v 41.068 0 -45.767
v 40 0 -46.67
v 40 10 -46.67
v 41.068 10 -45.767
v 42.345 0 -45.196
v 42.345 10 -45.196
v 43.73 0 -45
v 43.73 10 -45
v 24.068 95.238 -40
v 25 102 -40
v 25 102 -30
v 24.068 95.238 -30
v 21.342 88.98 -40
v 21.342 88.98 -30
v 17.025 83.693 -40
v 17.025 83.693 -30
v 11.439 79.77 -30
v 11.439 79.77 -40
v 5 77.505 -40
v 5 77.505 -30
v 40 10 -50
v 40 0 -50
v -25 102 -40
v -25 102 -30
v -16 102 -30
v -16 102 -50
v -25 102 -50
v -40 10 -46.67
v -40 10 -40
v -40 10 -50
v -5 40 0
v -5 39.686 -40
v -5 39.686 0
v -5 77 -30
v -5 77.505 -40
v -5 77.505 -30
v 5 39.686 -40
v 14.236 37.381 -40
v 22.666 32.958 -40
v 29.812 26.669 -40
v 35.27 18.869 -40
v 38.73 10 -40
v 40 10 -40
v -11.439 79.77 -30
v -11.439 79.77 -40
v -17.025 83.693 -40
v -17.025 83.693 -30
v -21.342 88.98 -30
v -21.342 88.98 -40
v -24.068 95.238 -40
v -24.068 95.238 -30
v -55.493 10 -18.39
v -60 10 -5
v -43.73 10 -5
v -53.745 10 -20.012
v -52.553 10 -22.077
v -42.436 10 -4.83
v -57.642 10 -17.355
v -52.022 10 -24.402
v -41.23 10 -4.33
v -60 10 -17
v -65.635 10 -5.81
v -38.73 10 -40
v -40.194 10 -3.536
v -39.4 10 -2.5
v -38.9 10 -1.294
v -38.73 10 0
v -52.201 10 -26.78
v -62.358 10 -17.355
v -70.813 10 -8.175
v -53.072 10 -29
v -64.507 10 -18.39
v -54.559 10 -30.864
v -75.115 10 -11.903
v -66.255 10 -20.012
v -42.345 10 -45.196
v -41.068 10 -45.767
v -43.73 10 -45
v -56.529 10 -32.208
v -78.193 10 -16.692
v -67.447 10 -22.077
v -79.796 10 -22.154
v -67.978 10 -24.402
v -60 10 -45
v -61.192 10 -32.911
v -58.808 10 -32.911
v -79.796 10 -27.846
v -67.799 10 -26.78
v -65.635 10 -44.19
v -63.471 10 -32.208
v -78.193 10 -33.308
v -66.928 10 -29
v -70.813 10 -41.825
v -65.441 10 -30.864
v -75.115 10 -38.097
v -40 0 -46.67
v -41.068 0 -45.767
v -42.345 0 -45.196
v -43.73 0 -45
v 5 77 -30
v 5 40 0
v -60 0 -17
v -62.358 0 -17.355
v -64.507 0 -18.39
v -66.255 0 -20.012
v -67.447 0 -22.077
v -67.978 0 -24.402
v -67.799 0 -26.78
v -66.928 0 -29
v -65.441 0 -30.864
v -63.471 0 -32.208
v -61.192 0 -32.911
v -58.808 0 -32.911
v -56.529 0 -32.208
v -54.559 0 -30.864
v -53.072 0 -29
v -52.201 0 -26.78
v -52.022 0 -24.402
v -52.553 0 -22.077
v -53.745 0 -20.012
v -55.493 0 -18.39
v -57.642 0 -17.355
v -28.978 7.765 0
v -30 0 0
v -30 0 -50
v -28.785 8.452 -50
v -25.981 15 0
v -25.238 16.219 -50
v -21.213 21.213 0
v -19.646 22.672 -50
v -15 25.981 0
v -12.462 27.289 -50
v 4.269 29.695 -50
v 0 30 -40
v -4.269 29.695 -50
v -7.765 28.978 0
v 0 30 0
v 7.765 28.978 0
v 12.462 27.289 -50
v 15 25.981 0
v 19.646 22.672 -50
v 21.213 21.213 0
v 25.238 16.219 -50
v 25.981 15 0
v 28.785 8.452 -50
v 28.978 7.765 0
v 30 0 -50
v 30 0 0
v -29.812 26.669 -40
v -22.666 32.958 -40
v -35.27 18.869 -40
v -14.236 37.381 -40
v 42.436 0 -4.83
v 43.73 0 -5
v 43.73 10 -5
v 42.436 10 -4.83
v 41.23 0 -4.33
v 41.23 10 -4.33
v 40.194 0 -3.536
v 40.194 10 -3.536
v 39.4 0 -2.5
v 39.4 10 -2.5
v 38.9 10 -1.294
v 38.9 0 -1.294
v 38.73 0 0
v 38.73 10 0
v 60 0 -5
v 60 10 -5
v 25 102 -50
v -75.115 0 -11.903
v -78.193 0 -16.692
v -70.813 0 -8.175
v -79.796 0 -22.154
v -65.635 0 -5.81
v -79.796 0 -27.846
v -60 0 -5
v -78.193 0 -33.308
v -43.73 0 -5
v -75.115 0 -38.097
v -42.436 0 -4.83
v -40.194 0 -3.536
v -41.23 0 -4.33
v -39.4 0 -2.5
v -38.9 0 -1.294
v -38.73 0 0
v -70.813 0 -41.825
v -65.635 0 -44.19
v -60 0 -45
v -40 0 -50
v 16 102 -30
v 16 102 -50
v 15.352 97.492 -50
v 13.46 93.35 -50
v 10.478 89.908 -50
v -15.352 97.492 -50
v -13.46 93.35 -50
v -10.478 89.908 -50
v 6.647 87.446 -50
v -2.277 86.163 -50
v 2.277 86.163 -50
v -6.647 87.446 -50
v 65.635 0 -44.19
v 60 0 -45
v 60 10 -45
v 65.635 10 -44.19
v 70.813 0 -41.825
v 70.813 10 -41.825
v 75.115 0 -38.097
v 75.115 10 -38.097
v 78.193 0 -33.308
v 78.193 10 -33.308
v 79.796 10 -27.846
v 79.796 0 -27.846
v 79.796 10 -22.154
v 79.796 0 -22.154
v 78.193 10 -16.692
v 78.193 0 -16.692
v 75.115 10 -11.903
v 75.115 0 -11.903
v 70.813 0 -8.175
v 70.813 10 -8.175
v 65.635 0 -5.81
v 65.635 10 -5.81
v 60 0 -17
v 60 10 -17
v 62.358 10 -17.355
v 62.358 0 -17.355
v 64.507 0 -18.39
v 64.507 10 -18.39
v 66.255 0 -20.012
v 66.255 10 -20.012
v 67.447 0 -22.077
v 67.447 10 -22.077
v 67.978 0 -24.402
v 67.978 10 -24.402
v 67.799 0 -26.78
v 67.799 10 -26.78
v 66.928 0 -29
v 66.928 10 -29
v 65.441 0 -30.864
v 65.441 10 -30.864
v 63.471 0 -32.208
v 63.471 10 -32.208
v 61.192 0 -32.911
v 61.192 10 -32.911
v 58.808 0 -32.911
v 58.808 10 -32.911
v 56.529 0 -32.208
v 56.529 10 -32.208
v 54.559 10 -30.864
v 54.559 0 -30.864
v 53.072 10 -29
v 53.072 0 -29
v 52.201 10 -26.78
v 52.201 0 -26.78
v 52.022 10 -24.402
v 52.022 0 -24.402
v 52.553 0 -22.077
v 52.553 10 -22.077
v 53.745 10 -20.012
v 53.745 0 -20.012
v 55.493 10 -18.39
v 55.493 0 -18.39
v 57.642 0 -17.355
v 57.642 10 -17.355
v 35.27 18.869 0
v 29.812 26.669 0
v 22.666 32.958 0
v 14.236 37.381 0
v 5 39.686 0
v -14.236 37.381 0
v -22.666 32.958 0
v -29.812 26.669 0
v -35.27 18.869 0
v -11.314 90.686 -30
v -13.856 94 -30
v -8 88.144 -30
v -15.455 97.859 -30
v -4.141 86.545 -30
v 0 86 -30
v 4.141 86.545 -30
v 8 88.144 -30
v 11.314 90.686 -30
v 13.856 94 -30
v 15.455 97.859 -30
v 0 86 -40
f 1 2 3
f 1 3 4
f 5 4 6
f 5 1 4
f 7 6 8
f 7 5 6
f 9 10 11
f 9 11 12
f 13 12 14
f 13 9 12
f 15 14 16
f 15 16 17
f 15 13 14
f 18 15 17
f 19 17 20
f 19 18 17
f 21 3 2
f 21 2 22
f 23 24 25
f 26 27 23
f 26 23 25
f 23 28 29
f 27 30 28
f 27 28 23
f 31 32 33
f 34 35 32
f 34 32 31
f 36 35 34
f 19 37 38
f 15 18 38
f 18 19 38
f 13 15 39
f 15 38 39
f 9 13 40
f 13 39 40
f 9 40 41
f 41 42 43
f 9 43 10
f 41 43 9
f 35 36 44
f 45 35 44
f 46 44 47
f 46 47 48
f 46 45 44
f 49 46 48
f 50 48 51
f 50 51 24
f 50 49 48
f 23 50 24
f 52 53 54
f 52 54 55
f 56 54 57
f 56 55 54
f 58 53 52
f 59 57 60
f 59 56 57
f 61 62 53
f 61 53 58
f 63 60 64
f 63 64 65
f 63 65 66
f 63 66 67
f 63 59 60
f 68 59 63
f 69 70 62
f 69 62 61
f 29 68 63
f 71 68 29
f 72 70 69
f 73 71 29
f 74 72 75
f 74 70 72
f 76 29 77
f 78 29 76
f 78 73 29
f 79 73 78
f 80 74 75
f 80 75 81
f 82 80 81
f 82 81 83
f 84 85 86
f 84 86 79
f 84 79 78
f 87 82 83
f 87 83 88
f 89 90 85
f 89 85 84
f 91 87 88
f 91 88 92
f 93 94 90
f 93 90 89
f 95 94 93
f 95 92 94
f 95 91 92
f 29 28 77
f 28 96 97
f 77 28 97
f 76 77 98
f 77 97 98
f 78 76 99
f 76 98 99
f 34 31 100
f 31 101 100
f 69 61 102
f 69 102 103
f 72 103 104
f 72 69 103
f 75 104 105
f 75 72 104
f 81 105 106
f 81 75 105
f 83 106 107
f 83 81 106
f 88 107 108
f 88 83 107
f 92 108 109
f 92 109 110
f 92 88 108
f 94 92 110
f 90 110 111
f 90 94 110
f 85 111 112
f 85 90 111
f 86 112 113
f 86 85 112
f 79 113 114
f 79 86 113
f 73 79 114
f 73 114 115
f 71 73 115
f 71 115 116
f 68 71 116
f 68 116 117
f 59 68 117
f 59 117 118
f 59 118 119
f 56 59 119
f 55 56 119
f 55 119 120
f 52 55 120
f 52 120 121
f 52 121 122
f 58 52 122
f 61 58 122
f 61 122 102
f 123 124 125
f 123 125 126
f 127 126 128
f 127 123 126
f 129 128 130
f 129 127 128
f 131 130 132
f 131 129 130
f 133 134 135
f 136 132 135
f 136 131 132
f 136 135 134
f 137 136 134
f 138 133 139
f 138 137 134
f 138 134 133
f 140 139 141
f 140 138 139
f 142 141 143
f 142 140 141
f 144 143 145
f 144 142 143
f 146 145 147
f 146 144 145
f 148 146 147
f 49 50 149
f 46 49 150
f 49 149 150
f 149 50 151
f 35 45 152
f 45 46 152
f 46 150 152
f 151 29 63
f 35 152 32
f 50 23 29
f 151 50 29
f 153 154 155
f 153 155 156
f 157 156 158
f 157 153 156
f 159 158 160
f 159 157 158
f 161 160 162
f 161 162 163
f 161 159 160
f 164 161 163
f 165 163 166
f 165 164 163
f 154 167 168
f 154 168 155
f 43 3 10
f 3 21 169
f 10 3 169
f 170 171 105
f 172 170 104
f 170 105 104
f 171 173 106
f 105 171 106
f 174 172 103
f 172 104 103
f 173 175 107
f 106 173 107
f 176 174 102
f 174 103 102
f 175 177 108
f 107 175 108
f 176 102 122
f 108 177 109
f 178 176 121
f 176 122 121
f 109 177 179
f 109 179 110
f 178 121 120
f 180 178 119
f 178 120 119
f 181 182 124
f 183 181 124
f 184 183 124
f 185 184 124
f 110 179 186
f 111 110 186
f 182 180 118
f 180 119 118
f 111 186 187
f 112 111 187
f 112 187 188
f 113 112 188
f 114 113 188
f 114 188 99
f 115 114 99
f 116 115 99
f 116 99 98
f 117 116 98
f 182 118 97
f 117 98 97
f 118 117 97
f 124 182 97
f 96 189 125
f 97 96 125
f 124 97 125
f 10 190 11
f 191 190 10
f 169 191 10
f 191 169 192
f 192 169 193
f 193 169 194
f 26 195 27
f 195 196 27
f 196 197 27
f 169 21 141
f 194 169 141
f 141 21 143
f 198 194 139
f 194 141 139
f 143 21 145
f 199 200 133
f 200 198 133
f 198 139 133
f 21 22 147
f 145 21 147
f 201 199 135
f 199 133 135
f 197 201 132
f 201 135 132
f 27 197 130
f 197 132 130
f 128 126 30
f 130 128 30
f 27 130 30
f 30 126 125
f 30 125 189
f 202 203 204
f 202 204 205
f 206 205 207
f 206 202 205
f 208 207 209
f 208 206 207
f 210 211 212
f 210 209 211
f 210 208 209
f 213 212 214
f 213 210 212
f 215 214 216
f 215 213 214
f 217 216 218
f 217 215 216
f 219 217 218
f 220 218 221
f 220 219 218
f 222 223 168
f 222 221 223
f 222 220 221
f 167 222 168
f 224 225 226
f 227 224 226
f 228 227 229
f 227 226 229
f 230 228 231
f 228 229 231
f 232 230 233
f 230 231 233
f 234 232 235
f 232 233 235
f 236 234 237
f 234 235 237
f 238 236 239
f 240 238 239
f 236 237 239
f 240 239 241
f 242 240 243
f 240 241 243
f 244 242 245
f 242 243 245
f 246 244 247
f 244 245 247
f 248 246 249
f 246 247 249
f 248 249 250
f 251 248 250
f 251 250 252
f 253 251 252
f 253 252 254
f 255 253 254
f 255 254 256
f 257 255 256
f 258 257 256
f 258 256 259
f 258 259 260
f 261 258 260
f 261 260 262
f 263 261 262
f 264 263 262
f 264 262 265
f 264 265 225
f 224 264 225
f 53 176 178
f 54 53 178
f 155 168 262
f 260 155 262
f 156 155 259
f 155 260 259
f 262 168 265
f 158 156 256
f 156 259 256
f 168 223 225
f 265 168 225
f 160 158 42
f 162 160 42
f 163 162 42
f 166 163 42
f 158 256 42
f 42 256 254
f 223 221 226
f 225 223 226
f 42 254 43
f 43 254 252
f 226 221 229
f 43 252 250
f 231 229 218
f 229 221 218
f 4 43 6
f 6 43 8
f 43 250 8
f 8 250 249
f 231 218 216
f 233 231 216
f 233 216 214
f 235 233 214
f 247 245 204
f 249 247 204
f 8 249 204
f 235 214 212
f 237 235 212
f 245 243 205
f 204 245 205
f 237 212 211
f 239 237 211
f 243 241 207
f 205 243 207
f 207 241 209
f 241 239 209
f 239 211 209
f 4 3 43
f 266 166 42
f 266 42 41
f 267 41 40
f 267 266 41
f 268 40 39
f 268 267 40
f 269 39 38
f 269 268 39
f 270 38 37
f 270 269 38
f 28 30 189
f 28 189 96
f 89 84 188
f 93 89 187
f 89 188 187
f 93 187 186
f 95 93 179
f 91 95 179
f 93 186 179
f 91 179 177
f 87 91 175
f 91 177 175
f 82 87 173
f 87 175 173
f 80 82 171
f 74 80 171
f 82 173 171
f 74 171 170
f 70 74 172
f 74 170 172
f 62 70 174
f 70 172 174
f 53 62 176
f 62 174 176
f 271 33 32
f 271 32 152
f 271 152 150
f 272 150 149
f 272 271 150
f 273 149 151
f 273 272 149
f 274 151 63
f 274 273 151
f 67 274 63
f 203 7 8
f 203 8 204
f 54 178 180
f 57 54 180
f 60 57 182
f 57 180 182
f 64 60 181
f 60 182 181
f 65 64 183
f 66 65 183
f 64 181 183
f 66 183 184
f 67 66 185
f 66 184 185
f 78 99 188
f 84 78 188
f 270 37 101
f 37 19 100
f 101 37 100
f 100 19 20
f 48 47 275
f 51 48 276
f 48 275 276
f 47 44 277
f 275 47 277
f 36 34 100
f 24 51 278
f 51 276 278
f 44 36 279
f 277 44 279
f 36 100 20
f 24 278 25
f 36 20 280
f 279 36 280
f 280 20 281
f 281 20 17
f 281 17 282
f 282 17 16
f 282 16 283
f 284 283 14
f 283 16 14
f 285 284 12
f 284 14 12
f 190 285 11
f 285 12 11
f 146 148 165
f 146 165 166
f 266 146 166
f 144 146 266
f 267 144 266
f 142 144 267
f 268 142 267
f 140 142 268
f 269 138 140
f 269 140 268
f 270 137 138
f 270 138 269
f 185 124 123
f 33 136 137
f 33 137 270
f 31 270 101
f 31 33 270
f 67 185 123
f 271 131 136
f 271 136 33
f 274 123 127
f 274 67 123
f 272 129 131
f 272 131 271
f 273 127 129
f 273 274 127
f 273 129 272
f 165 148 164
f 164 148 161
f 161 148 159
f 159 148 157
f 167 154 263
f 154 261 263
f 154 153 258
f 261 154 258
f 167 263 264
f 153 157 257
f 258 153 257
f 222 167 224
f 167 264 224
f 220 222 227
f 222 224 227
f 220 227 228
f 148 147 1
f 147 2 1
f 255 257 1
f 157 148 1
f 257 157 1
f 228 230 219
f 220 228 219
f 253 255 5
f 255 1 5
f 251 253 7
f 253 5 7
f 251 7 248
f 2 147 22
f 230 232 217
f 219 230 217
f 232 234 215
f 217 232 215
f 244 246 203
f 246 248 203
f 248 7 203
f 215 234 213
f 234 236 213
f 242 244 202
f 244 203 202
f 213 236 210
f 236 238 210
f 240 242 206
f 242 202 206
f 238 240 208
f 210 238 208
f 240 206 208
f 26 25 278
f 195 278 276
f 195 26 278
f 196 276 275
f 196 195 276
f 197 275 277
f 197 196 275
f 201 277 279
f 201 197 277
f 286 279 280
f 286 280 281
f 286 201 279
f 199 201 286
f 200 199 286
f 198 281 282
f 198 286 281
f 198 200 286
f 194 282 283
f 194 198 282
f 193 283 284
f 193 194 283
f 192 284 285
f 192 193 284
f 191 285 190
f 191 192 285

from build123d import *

# Parameters (mm, degrees)
BOSS_EXTRUDE1_DEPTH      = 40
BOSS_EXTRUDE2_REACH      = 151.282
BOSS_EXTRUDE2_END_RADIUS = 39.99999999999999
BOSS_EXTRUDE2_START      = 80
SKETCH2_W                = 50.00000000000001
SKETCH2_H                = 10
CUT_EXTRUDE6_START       = -10
CUT_EXTRUDE6_DEPTH       = 10
BOSS_EXTRUDE4_DEPTH      = 102
CUT_EXTRUDE7_REACH       = 140.939
BOSS_EXTRUDE5_DEPTH      = 10
CUT_EXTRUDE8_START       = -10
CUT_EXTRUDE8_DEPTH       = 10
CUT_EXTRUDE9_REACH       = 133.773
SKETCH9_R                = 8.000000000000012
BOSS_EXTRUDE6_DEPTH      = 5


with BuildPart() as part:
    # Sketch1 → Boss-Extrude1 (new body)
    with BuildSketch(Plane.XY):
        with BuildLine():
            Line((-39.999999999999986, 0), (-30, 0))
            ThreePointArc((-30, 0), (1.84e-15, 30), (30, 0))
            Line((30, 0), (39.99999999999999, 0))
            ThreePointArc((39.99999999999999, 0), (2.45e-15, 39.99999999999999), (-39.999999999999986, 0))
        make_face()
    extrude(amount=-BOSS_EXTRUDE1_DEPTH)

    # Boss-Extrude2: up to this cylinder (the profile starts outside it)
    boss_extrude2_end = Plane(origin=(0, 0, -25), z_dir=(0, 0, 1)) * Cylinder(BOSS_EXTRUDE2_END_RADIUS, 383.564, mode=Mode.PRIVATE)
    # Sketch2 → Boss-Extrude2 (add, up to the surface)
    with BuildSketch(Plane(origin=(0, 0, 0), x_dir=(0, 0, -1), z_dir=(1, 0, 0)).offset(BOSS_EXTRUDE2_START), mode=Mode.PRIVATE) as boss_extrude2_sk1:
        with Locations((25.000000000000004, 5)):
            Rectangle(SKETCH2_W, SKETCH2_H)
    boss_extrude2_tool1 = extrude(boss_extrude2_sk1.sketch, amount=-BOSS_EXTRUDE2_REACH, mode=Mode.PRIVATE) - boss_extrude2_end
    boss_extrude2 = boss_extrude2_tool1.solids().sort_by_distance((80, 5, -25))[0]
    add(boss_extrude2)

    # Sketch3 → Cut-Extrude6 (cut)
    with BuildSketch(Plane(origin=(0, 10, 0), x_dir=(1, 0, 0), z_dir=(0, 1, 0)).offset(CUT_EXTRUDE6_START)):
        with BuildLine():
            ThreePointArc((43.72983346207417, 5.000000000000001), (40.194299556141424, 3.5355339059327426), (38.72983346207416, 0))
            Line((38.72983346207416, 0), (80, 0))
            Line((80, 0), (80, 25.000000000000007))
            ThreePointArc((80, 25.000000000000007), (74.14213562373095, 10.857864376269053), (60, 5))
            Line((60, 5.000000000000001), (43.72983346207417, 5))
        make_face()
        with BuildLine():
            Line((80, 50), (38.72983346207416, 50))
            ThreePointArc((38.72983346207416, 50), (40.194299556141424, 46.464466094067255), (43.72983346207417, 45))
            Line((43.72983346207417, 45), (60, 45))
            ThreePointArc((60, 45), (74.14213562373095, 39.14213562373095), (80, 25.000000000000007))
            Line((80, 25.000000000000007), (80, 50))
        make_face()
    cut_extrude6 = extrude(amount=CUT_EXTRUDE6_DEPTH, mode=Mode.SUBTRACT)

    # Mirror1: Boss-Extrude2, Cut-Extrude6 across plane
    add(boss_extrude2.mirror(Plane(origin=(0, 0, 0), x_dir=(0, 0, 1), z_dir=(1, 0, 0))))
    add(cut_extrude6.mirror(Plane(origin=(0, 0, 0), x_dir=(0, 0, 1), z_dir=(1, 0, 0))), mode=Mode.SUBTRACT)

    # Sketch4 → Boss-Extrude4 (add)
    with BuildSketch(Plane(origin=(0, 0, 0), x_dir=(1, 0, 0), z_dir=(0, 1, 0))):
        Polygon((-39.99999999999999, 40), (39.99999999999999, 40), (39.99999999999999, 50.00000000000003), (-39.99999999999999, 50), align=None)
    extrude(amount=BOSS_EXTRUDE4_DEPTH)

    # Sketch6 → Cut-Extrude7 (cut, up to next)
    with BuildSketch(Plane(origin=(-1.735e-14, 0, -50.000000000000014), x_dir=(-1, 0, 3.5e-16), z_dir=(-3.5e-16, 0, -1)), mode=Mode.PRIVATE) as cut_extrude7_sk1:
        with BuildLine():
            Line((-30, 0), (30, 0))
            ThreePointArc((30, 0), (1.84e-15, 30), (-30, 0))
        make_face()
    cut_extrude7_tool1 = extrude(cut_extrude7_sk1.sketch, amount=-CUT_EXTRUDE7_REACH, mode=Mode.PRIVATE) & part.part
    add(cut_extrude7_tool1.solids().sort_by_distance((0, 12.732395, -50))[0], mode=Mode.SUBTRACT)

    # Sketch7 → Boss-Extrude5 (add)
    with BuildSketch(Plane.XY.offset(-40)):
        with BuildLine():
            Line((-25, 102), (-16, 102))
            ThreePointArc((-16, 102), (-2.94e-15, 86), (16, 102))
            Line((16, 102), (25, 102))
            ThreePointArc((25, 102), (-4.59e-15, 77), (-25, 102))
        make_face()
    extrude(amount=BOSS_EXTRUDE5_DEPTH)

    # Sketch8 → Cut-Extrude8 (cut)
    with BuildSketch(Plane.XY.offset(-40).offset(CUT_EXTRUDE8_START)):
        with BuildLine():
            Line((16, 102), (-16, 101.99999999999989))
            ThreePointArc((-16, 101.99999999999989), (5.782e-14, 85.99999999999994), (16, 102))
        make_face()
        Polygon((-25, 102), (-39.99999999999999, 102), (-39.99999999999999, 10), align=None)
        Polygon((25.000000000000004, 102), (39.99999999999999, 102), (39.99999999999999, 9.999999999999998), align=None)
    extrude(amount=CUT_EXTRUDE8_DEPTH, mode=Mode.SUBTRACT)

    # Sketch9 → Cut-Extrude9 (cut, up to next)
    with BuildSketch(Plane(origin=(0, 10, 0), x_dir=(1, 0, 0), z_dir=(0, 1, 0)), mode=Mode.PRIVATE) as cut_extrude9_sk1:
        with Locations(Location((60, 25, 0), (0, 0, 270))):
            Circle(SKETCH9_R)
    cut_extrude9_tool1 = extrude(cut_extrude9_sk1.sketch, amount=-CUT_EXTRUDE9_REACH, mode=Mode.PRIVATE) & part.part
    cut_extrude9 = cut_extrude9_tool1.solids().sort_by_distance((60, 10, -25))[0]
    add(cut_extrude9, mode=Mode.SUBTRACT)

    # Mirror2: Cut-Extrude9 across plane
    add(cut_extrude9.mirror(Plane(origin=(0, 0, 0), x_dir=(0, 0, 1), z_dir=(1, 0, 0))), mode=Mode.SUBTRACT)

    # Sketch11 → Boss-Extrude6 (add, symmetric)
    with BuildSketch(Plane(origin=(0, 0, 0), x_dir=(0, 0, -1), z_dir=(1, 0, 0))):
        Polygon((0, 30), (0, 39.99999999999999), (30, 76.99999999999999), (30, 86), (40, 86), (40, 30), align=None)
    extrude(amount=BOSS_EXTRUDE6_DEPTH, both=True)


solid = part.part
